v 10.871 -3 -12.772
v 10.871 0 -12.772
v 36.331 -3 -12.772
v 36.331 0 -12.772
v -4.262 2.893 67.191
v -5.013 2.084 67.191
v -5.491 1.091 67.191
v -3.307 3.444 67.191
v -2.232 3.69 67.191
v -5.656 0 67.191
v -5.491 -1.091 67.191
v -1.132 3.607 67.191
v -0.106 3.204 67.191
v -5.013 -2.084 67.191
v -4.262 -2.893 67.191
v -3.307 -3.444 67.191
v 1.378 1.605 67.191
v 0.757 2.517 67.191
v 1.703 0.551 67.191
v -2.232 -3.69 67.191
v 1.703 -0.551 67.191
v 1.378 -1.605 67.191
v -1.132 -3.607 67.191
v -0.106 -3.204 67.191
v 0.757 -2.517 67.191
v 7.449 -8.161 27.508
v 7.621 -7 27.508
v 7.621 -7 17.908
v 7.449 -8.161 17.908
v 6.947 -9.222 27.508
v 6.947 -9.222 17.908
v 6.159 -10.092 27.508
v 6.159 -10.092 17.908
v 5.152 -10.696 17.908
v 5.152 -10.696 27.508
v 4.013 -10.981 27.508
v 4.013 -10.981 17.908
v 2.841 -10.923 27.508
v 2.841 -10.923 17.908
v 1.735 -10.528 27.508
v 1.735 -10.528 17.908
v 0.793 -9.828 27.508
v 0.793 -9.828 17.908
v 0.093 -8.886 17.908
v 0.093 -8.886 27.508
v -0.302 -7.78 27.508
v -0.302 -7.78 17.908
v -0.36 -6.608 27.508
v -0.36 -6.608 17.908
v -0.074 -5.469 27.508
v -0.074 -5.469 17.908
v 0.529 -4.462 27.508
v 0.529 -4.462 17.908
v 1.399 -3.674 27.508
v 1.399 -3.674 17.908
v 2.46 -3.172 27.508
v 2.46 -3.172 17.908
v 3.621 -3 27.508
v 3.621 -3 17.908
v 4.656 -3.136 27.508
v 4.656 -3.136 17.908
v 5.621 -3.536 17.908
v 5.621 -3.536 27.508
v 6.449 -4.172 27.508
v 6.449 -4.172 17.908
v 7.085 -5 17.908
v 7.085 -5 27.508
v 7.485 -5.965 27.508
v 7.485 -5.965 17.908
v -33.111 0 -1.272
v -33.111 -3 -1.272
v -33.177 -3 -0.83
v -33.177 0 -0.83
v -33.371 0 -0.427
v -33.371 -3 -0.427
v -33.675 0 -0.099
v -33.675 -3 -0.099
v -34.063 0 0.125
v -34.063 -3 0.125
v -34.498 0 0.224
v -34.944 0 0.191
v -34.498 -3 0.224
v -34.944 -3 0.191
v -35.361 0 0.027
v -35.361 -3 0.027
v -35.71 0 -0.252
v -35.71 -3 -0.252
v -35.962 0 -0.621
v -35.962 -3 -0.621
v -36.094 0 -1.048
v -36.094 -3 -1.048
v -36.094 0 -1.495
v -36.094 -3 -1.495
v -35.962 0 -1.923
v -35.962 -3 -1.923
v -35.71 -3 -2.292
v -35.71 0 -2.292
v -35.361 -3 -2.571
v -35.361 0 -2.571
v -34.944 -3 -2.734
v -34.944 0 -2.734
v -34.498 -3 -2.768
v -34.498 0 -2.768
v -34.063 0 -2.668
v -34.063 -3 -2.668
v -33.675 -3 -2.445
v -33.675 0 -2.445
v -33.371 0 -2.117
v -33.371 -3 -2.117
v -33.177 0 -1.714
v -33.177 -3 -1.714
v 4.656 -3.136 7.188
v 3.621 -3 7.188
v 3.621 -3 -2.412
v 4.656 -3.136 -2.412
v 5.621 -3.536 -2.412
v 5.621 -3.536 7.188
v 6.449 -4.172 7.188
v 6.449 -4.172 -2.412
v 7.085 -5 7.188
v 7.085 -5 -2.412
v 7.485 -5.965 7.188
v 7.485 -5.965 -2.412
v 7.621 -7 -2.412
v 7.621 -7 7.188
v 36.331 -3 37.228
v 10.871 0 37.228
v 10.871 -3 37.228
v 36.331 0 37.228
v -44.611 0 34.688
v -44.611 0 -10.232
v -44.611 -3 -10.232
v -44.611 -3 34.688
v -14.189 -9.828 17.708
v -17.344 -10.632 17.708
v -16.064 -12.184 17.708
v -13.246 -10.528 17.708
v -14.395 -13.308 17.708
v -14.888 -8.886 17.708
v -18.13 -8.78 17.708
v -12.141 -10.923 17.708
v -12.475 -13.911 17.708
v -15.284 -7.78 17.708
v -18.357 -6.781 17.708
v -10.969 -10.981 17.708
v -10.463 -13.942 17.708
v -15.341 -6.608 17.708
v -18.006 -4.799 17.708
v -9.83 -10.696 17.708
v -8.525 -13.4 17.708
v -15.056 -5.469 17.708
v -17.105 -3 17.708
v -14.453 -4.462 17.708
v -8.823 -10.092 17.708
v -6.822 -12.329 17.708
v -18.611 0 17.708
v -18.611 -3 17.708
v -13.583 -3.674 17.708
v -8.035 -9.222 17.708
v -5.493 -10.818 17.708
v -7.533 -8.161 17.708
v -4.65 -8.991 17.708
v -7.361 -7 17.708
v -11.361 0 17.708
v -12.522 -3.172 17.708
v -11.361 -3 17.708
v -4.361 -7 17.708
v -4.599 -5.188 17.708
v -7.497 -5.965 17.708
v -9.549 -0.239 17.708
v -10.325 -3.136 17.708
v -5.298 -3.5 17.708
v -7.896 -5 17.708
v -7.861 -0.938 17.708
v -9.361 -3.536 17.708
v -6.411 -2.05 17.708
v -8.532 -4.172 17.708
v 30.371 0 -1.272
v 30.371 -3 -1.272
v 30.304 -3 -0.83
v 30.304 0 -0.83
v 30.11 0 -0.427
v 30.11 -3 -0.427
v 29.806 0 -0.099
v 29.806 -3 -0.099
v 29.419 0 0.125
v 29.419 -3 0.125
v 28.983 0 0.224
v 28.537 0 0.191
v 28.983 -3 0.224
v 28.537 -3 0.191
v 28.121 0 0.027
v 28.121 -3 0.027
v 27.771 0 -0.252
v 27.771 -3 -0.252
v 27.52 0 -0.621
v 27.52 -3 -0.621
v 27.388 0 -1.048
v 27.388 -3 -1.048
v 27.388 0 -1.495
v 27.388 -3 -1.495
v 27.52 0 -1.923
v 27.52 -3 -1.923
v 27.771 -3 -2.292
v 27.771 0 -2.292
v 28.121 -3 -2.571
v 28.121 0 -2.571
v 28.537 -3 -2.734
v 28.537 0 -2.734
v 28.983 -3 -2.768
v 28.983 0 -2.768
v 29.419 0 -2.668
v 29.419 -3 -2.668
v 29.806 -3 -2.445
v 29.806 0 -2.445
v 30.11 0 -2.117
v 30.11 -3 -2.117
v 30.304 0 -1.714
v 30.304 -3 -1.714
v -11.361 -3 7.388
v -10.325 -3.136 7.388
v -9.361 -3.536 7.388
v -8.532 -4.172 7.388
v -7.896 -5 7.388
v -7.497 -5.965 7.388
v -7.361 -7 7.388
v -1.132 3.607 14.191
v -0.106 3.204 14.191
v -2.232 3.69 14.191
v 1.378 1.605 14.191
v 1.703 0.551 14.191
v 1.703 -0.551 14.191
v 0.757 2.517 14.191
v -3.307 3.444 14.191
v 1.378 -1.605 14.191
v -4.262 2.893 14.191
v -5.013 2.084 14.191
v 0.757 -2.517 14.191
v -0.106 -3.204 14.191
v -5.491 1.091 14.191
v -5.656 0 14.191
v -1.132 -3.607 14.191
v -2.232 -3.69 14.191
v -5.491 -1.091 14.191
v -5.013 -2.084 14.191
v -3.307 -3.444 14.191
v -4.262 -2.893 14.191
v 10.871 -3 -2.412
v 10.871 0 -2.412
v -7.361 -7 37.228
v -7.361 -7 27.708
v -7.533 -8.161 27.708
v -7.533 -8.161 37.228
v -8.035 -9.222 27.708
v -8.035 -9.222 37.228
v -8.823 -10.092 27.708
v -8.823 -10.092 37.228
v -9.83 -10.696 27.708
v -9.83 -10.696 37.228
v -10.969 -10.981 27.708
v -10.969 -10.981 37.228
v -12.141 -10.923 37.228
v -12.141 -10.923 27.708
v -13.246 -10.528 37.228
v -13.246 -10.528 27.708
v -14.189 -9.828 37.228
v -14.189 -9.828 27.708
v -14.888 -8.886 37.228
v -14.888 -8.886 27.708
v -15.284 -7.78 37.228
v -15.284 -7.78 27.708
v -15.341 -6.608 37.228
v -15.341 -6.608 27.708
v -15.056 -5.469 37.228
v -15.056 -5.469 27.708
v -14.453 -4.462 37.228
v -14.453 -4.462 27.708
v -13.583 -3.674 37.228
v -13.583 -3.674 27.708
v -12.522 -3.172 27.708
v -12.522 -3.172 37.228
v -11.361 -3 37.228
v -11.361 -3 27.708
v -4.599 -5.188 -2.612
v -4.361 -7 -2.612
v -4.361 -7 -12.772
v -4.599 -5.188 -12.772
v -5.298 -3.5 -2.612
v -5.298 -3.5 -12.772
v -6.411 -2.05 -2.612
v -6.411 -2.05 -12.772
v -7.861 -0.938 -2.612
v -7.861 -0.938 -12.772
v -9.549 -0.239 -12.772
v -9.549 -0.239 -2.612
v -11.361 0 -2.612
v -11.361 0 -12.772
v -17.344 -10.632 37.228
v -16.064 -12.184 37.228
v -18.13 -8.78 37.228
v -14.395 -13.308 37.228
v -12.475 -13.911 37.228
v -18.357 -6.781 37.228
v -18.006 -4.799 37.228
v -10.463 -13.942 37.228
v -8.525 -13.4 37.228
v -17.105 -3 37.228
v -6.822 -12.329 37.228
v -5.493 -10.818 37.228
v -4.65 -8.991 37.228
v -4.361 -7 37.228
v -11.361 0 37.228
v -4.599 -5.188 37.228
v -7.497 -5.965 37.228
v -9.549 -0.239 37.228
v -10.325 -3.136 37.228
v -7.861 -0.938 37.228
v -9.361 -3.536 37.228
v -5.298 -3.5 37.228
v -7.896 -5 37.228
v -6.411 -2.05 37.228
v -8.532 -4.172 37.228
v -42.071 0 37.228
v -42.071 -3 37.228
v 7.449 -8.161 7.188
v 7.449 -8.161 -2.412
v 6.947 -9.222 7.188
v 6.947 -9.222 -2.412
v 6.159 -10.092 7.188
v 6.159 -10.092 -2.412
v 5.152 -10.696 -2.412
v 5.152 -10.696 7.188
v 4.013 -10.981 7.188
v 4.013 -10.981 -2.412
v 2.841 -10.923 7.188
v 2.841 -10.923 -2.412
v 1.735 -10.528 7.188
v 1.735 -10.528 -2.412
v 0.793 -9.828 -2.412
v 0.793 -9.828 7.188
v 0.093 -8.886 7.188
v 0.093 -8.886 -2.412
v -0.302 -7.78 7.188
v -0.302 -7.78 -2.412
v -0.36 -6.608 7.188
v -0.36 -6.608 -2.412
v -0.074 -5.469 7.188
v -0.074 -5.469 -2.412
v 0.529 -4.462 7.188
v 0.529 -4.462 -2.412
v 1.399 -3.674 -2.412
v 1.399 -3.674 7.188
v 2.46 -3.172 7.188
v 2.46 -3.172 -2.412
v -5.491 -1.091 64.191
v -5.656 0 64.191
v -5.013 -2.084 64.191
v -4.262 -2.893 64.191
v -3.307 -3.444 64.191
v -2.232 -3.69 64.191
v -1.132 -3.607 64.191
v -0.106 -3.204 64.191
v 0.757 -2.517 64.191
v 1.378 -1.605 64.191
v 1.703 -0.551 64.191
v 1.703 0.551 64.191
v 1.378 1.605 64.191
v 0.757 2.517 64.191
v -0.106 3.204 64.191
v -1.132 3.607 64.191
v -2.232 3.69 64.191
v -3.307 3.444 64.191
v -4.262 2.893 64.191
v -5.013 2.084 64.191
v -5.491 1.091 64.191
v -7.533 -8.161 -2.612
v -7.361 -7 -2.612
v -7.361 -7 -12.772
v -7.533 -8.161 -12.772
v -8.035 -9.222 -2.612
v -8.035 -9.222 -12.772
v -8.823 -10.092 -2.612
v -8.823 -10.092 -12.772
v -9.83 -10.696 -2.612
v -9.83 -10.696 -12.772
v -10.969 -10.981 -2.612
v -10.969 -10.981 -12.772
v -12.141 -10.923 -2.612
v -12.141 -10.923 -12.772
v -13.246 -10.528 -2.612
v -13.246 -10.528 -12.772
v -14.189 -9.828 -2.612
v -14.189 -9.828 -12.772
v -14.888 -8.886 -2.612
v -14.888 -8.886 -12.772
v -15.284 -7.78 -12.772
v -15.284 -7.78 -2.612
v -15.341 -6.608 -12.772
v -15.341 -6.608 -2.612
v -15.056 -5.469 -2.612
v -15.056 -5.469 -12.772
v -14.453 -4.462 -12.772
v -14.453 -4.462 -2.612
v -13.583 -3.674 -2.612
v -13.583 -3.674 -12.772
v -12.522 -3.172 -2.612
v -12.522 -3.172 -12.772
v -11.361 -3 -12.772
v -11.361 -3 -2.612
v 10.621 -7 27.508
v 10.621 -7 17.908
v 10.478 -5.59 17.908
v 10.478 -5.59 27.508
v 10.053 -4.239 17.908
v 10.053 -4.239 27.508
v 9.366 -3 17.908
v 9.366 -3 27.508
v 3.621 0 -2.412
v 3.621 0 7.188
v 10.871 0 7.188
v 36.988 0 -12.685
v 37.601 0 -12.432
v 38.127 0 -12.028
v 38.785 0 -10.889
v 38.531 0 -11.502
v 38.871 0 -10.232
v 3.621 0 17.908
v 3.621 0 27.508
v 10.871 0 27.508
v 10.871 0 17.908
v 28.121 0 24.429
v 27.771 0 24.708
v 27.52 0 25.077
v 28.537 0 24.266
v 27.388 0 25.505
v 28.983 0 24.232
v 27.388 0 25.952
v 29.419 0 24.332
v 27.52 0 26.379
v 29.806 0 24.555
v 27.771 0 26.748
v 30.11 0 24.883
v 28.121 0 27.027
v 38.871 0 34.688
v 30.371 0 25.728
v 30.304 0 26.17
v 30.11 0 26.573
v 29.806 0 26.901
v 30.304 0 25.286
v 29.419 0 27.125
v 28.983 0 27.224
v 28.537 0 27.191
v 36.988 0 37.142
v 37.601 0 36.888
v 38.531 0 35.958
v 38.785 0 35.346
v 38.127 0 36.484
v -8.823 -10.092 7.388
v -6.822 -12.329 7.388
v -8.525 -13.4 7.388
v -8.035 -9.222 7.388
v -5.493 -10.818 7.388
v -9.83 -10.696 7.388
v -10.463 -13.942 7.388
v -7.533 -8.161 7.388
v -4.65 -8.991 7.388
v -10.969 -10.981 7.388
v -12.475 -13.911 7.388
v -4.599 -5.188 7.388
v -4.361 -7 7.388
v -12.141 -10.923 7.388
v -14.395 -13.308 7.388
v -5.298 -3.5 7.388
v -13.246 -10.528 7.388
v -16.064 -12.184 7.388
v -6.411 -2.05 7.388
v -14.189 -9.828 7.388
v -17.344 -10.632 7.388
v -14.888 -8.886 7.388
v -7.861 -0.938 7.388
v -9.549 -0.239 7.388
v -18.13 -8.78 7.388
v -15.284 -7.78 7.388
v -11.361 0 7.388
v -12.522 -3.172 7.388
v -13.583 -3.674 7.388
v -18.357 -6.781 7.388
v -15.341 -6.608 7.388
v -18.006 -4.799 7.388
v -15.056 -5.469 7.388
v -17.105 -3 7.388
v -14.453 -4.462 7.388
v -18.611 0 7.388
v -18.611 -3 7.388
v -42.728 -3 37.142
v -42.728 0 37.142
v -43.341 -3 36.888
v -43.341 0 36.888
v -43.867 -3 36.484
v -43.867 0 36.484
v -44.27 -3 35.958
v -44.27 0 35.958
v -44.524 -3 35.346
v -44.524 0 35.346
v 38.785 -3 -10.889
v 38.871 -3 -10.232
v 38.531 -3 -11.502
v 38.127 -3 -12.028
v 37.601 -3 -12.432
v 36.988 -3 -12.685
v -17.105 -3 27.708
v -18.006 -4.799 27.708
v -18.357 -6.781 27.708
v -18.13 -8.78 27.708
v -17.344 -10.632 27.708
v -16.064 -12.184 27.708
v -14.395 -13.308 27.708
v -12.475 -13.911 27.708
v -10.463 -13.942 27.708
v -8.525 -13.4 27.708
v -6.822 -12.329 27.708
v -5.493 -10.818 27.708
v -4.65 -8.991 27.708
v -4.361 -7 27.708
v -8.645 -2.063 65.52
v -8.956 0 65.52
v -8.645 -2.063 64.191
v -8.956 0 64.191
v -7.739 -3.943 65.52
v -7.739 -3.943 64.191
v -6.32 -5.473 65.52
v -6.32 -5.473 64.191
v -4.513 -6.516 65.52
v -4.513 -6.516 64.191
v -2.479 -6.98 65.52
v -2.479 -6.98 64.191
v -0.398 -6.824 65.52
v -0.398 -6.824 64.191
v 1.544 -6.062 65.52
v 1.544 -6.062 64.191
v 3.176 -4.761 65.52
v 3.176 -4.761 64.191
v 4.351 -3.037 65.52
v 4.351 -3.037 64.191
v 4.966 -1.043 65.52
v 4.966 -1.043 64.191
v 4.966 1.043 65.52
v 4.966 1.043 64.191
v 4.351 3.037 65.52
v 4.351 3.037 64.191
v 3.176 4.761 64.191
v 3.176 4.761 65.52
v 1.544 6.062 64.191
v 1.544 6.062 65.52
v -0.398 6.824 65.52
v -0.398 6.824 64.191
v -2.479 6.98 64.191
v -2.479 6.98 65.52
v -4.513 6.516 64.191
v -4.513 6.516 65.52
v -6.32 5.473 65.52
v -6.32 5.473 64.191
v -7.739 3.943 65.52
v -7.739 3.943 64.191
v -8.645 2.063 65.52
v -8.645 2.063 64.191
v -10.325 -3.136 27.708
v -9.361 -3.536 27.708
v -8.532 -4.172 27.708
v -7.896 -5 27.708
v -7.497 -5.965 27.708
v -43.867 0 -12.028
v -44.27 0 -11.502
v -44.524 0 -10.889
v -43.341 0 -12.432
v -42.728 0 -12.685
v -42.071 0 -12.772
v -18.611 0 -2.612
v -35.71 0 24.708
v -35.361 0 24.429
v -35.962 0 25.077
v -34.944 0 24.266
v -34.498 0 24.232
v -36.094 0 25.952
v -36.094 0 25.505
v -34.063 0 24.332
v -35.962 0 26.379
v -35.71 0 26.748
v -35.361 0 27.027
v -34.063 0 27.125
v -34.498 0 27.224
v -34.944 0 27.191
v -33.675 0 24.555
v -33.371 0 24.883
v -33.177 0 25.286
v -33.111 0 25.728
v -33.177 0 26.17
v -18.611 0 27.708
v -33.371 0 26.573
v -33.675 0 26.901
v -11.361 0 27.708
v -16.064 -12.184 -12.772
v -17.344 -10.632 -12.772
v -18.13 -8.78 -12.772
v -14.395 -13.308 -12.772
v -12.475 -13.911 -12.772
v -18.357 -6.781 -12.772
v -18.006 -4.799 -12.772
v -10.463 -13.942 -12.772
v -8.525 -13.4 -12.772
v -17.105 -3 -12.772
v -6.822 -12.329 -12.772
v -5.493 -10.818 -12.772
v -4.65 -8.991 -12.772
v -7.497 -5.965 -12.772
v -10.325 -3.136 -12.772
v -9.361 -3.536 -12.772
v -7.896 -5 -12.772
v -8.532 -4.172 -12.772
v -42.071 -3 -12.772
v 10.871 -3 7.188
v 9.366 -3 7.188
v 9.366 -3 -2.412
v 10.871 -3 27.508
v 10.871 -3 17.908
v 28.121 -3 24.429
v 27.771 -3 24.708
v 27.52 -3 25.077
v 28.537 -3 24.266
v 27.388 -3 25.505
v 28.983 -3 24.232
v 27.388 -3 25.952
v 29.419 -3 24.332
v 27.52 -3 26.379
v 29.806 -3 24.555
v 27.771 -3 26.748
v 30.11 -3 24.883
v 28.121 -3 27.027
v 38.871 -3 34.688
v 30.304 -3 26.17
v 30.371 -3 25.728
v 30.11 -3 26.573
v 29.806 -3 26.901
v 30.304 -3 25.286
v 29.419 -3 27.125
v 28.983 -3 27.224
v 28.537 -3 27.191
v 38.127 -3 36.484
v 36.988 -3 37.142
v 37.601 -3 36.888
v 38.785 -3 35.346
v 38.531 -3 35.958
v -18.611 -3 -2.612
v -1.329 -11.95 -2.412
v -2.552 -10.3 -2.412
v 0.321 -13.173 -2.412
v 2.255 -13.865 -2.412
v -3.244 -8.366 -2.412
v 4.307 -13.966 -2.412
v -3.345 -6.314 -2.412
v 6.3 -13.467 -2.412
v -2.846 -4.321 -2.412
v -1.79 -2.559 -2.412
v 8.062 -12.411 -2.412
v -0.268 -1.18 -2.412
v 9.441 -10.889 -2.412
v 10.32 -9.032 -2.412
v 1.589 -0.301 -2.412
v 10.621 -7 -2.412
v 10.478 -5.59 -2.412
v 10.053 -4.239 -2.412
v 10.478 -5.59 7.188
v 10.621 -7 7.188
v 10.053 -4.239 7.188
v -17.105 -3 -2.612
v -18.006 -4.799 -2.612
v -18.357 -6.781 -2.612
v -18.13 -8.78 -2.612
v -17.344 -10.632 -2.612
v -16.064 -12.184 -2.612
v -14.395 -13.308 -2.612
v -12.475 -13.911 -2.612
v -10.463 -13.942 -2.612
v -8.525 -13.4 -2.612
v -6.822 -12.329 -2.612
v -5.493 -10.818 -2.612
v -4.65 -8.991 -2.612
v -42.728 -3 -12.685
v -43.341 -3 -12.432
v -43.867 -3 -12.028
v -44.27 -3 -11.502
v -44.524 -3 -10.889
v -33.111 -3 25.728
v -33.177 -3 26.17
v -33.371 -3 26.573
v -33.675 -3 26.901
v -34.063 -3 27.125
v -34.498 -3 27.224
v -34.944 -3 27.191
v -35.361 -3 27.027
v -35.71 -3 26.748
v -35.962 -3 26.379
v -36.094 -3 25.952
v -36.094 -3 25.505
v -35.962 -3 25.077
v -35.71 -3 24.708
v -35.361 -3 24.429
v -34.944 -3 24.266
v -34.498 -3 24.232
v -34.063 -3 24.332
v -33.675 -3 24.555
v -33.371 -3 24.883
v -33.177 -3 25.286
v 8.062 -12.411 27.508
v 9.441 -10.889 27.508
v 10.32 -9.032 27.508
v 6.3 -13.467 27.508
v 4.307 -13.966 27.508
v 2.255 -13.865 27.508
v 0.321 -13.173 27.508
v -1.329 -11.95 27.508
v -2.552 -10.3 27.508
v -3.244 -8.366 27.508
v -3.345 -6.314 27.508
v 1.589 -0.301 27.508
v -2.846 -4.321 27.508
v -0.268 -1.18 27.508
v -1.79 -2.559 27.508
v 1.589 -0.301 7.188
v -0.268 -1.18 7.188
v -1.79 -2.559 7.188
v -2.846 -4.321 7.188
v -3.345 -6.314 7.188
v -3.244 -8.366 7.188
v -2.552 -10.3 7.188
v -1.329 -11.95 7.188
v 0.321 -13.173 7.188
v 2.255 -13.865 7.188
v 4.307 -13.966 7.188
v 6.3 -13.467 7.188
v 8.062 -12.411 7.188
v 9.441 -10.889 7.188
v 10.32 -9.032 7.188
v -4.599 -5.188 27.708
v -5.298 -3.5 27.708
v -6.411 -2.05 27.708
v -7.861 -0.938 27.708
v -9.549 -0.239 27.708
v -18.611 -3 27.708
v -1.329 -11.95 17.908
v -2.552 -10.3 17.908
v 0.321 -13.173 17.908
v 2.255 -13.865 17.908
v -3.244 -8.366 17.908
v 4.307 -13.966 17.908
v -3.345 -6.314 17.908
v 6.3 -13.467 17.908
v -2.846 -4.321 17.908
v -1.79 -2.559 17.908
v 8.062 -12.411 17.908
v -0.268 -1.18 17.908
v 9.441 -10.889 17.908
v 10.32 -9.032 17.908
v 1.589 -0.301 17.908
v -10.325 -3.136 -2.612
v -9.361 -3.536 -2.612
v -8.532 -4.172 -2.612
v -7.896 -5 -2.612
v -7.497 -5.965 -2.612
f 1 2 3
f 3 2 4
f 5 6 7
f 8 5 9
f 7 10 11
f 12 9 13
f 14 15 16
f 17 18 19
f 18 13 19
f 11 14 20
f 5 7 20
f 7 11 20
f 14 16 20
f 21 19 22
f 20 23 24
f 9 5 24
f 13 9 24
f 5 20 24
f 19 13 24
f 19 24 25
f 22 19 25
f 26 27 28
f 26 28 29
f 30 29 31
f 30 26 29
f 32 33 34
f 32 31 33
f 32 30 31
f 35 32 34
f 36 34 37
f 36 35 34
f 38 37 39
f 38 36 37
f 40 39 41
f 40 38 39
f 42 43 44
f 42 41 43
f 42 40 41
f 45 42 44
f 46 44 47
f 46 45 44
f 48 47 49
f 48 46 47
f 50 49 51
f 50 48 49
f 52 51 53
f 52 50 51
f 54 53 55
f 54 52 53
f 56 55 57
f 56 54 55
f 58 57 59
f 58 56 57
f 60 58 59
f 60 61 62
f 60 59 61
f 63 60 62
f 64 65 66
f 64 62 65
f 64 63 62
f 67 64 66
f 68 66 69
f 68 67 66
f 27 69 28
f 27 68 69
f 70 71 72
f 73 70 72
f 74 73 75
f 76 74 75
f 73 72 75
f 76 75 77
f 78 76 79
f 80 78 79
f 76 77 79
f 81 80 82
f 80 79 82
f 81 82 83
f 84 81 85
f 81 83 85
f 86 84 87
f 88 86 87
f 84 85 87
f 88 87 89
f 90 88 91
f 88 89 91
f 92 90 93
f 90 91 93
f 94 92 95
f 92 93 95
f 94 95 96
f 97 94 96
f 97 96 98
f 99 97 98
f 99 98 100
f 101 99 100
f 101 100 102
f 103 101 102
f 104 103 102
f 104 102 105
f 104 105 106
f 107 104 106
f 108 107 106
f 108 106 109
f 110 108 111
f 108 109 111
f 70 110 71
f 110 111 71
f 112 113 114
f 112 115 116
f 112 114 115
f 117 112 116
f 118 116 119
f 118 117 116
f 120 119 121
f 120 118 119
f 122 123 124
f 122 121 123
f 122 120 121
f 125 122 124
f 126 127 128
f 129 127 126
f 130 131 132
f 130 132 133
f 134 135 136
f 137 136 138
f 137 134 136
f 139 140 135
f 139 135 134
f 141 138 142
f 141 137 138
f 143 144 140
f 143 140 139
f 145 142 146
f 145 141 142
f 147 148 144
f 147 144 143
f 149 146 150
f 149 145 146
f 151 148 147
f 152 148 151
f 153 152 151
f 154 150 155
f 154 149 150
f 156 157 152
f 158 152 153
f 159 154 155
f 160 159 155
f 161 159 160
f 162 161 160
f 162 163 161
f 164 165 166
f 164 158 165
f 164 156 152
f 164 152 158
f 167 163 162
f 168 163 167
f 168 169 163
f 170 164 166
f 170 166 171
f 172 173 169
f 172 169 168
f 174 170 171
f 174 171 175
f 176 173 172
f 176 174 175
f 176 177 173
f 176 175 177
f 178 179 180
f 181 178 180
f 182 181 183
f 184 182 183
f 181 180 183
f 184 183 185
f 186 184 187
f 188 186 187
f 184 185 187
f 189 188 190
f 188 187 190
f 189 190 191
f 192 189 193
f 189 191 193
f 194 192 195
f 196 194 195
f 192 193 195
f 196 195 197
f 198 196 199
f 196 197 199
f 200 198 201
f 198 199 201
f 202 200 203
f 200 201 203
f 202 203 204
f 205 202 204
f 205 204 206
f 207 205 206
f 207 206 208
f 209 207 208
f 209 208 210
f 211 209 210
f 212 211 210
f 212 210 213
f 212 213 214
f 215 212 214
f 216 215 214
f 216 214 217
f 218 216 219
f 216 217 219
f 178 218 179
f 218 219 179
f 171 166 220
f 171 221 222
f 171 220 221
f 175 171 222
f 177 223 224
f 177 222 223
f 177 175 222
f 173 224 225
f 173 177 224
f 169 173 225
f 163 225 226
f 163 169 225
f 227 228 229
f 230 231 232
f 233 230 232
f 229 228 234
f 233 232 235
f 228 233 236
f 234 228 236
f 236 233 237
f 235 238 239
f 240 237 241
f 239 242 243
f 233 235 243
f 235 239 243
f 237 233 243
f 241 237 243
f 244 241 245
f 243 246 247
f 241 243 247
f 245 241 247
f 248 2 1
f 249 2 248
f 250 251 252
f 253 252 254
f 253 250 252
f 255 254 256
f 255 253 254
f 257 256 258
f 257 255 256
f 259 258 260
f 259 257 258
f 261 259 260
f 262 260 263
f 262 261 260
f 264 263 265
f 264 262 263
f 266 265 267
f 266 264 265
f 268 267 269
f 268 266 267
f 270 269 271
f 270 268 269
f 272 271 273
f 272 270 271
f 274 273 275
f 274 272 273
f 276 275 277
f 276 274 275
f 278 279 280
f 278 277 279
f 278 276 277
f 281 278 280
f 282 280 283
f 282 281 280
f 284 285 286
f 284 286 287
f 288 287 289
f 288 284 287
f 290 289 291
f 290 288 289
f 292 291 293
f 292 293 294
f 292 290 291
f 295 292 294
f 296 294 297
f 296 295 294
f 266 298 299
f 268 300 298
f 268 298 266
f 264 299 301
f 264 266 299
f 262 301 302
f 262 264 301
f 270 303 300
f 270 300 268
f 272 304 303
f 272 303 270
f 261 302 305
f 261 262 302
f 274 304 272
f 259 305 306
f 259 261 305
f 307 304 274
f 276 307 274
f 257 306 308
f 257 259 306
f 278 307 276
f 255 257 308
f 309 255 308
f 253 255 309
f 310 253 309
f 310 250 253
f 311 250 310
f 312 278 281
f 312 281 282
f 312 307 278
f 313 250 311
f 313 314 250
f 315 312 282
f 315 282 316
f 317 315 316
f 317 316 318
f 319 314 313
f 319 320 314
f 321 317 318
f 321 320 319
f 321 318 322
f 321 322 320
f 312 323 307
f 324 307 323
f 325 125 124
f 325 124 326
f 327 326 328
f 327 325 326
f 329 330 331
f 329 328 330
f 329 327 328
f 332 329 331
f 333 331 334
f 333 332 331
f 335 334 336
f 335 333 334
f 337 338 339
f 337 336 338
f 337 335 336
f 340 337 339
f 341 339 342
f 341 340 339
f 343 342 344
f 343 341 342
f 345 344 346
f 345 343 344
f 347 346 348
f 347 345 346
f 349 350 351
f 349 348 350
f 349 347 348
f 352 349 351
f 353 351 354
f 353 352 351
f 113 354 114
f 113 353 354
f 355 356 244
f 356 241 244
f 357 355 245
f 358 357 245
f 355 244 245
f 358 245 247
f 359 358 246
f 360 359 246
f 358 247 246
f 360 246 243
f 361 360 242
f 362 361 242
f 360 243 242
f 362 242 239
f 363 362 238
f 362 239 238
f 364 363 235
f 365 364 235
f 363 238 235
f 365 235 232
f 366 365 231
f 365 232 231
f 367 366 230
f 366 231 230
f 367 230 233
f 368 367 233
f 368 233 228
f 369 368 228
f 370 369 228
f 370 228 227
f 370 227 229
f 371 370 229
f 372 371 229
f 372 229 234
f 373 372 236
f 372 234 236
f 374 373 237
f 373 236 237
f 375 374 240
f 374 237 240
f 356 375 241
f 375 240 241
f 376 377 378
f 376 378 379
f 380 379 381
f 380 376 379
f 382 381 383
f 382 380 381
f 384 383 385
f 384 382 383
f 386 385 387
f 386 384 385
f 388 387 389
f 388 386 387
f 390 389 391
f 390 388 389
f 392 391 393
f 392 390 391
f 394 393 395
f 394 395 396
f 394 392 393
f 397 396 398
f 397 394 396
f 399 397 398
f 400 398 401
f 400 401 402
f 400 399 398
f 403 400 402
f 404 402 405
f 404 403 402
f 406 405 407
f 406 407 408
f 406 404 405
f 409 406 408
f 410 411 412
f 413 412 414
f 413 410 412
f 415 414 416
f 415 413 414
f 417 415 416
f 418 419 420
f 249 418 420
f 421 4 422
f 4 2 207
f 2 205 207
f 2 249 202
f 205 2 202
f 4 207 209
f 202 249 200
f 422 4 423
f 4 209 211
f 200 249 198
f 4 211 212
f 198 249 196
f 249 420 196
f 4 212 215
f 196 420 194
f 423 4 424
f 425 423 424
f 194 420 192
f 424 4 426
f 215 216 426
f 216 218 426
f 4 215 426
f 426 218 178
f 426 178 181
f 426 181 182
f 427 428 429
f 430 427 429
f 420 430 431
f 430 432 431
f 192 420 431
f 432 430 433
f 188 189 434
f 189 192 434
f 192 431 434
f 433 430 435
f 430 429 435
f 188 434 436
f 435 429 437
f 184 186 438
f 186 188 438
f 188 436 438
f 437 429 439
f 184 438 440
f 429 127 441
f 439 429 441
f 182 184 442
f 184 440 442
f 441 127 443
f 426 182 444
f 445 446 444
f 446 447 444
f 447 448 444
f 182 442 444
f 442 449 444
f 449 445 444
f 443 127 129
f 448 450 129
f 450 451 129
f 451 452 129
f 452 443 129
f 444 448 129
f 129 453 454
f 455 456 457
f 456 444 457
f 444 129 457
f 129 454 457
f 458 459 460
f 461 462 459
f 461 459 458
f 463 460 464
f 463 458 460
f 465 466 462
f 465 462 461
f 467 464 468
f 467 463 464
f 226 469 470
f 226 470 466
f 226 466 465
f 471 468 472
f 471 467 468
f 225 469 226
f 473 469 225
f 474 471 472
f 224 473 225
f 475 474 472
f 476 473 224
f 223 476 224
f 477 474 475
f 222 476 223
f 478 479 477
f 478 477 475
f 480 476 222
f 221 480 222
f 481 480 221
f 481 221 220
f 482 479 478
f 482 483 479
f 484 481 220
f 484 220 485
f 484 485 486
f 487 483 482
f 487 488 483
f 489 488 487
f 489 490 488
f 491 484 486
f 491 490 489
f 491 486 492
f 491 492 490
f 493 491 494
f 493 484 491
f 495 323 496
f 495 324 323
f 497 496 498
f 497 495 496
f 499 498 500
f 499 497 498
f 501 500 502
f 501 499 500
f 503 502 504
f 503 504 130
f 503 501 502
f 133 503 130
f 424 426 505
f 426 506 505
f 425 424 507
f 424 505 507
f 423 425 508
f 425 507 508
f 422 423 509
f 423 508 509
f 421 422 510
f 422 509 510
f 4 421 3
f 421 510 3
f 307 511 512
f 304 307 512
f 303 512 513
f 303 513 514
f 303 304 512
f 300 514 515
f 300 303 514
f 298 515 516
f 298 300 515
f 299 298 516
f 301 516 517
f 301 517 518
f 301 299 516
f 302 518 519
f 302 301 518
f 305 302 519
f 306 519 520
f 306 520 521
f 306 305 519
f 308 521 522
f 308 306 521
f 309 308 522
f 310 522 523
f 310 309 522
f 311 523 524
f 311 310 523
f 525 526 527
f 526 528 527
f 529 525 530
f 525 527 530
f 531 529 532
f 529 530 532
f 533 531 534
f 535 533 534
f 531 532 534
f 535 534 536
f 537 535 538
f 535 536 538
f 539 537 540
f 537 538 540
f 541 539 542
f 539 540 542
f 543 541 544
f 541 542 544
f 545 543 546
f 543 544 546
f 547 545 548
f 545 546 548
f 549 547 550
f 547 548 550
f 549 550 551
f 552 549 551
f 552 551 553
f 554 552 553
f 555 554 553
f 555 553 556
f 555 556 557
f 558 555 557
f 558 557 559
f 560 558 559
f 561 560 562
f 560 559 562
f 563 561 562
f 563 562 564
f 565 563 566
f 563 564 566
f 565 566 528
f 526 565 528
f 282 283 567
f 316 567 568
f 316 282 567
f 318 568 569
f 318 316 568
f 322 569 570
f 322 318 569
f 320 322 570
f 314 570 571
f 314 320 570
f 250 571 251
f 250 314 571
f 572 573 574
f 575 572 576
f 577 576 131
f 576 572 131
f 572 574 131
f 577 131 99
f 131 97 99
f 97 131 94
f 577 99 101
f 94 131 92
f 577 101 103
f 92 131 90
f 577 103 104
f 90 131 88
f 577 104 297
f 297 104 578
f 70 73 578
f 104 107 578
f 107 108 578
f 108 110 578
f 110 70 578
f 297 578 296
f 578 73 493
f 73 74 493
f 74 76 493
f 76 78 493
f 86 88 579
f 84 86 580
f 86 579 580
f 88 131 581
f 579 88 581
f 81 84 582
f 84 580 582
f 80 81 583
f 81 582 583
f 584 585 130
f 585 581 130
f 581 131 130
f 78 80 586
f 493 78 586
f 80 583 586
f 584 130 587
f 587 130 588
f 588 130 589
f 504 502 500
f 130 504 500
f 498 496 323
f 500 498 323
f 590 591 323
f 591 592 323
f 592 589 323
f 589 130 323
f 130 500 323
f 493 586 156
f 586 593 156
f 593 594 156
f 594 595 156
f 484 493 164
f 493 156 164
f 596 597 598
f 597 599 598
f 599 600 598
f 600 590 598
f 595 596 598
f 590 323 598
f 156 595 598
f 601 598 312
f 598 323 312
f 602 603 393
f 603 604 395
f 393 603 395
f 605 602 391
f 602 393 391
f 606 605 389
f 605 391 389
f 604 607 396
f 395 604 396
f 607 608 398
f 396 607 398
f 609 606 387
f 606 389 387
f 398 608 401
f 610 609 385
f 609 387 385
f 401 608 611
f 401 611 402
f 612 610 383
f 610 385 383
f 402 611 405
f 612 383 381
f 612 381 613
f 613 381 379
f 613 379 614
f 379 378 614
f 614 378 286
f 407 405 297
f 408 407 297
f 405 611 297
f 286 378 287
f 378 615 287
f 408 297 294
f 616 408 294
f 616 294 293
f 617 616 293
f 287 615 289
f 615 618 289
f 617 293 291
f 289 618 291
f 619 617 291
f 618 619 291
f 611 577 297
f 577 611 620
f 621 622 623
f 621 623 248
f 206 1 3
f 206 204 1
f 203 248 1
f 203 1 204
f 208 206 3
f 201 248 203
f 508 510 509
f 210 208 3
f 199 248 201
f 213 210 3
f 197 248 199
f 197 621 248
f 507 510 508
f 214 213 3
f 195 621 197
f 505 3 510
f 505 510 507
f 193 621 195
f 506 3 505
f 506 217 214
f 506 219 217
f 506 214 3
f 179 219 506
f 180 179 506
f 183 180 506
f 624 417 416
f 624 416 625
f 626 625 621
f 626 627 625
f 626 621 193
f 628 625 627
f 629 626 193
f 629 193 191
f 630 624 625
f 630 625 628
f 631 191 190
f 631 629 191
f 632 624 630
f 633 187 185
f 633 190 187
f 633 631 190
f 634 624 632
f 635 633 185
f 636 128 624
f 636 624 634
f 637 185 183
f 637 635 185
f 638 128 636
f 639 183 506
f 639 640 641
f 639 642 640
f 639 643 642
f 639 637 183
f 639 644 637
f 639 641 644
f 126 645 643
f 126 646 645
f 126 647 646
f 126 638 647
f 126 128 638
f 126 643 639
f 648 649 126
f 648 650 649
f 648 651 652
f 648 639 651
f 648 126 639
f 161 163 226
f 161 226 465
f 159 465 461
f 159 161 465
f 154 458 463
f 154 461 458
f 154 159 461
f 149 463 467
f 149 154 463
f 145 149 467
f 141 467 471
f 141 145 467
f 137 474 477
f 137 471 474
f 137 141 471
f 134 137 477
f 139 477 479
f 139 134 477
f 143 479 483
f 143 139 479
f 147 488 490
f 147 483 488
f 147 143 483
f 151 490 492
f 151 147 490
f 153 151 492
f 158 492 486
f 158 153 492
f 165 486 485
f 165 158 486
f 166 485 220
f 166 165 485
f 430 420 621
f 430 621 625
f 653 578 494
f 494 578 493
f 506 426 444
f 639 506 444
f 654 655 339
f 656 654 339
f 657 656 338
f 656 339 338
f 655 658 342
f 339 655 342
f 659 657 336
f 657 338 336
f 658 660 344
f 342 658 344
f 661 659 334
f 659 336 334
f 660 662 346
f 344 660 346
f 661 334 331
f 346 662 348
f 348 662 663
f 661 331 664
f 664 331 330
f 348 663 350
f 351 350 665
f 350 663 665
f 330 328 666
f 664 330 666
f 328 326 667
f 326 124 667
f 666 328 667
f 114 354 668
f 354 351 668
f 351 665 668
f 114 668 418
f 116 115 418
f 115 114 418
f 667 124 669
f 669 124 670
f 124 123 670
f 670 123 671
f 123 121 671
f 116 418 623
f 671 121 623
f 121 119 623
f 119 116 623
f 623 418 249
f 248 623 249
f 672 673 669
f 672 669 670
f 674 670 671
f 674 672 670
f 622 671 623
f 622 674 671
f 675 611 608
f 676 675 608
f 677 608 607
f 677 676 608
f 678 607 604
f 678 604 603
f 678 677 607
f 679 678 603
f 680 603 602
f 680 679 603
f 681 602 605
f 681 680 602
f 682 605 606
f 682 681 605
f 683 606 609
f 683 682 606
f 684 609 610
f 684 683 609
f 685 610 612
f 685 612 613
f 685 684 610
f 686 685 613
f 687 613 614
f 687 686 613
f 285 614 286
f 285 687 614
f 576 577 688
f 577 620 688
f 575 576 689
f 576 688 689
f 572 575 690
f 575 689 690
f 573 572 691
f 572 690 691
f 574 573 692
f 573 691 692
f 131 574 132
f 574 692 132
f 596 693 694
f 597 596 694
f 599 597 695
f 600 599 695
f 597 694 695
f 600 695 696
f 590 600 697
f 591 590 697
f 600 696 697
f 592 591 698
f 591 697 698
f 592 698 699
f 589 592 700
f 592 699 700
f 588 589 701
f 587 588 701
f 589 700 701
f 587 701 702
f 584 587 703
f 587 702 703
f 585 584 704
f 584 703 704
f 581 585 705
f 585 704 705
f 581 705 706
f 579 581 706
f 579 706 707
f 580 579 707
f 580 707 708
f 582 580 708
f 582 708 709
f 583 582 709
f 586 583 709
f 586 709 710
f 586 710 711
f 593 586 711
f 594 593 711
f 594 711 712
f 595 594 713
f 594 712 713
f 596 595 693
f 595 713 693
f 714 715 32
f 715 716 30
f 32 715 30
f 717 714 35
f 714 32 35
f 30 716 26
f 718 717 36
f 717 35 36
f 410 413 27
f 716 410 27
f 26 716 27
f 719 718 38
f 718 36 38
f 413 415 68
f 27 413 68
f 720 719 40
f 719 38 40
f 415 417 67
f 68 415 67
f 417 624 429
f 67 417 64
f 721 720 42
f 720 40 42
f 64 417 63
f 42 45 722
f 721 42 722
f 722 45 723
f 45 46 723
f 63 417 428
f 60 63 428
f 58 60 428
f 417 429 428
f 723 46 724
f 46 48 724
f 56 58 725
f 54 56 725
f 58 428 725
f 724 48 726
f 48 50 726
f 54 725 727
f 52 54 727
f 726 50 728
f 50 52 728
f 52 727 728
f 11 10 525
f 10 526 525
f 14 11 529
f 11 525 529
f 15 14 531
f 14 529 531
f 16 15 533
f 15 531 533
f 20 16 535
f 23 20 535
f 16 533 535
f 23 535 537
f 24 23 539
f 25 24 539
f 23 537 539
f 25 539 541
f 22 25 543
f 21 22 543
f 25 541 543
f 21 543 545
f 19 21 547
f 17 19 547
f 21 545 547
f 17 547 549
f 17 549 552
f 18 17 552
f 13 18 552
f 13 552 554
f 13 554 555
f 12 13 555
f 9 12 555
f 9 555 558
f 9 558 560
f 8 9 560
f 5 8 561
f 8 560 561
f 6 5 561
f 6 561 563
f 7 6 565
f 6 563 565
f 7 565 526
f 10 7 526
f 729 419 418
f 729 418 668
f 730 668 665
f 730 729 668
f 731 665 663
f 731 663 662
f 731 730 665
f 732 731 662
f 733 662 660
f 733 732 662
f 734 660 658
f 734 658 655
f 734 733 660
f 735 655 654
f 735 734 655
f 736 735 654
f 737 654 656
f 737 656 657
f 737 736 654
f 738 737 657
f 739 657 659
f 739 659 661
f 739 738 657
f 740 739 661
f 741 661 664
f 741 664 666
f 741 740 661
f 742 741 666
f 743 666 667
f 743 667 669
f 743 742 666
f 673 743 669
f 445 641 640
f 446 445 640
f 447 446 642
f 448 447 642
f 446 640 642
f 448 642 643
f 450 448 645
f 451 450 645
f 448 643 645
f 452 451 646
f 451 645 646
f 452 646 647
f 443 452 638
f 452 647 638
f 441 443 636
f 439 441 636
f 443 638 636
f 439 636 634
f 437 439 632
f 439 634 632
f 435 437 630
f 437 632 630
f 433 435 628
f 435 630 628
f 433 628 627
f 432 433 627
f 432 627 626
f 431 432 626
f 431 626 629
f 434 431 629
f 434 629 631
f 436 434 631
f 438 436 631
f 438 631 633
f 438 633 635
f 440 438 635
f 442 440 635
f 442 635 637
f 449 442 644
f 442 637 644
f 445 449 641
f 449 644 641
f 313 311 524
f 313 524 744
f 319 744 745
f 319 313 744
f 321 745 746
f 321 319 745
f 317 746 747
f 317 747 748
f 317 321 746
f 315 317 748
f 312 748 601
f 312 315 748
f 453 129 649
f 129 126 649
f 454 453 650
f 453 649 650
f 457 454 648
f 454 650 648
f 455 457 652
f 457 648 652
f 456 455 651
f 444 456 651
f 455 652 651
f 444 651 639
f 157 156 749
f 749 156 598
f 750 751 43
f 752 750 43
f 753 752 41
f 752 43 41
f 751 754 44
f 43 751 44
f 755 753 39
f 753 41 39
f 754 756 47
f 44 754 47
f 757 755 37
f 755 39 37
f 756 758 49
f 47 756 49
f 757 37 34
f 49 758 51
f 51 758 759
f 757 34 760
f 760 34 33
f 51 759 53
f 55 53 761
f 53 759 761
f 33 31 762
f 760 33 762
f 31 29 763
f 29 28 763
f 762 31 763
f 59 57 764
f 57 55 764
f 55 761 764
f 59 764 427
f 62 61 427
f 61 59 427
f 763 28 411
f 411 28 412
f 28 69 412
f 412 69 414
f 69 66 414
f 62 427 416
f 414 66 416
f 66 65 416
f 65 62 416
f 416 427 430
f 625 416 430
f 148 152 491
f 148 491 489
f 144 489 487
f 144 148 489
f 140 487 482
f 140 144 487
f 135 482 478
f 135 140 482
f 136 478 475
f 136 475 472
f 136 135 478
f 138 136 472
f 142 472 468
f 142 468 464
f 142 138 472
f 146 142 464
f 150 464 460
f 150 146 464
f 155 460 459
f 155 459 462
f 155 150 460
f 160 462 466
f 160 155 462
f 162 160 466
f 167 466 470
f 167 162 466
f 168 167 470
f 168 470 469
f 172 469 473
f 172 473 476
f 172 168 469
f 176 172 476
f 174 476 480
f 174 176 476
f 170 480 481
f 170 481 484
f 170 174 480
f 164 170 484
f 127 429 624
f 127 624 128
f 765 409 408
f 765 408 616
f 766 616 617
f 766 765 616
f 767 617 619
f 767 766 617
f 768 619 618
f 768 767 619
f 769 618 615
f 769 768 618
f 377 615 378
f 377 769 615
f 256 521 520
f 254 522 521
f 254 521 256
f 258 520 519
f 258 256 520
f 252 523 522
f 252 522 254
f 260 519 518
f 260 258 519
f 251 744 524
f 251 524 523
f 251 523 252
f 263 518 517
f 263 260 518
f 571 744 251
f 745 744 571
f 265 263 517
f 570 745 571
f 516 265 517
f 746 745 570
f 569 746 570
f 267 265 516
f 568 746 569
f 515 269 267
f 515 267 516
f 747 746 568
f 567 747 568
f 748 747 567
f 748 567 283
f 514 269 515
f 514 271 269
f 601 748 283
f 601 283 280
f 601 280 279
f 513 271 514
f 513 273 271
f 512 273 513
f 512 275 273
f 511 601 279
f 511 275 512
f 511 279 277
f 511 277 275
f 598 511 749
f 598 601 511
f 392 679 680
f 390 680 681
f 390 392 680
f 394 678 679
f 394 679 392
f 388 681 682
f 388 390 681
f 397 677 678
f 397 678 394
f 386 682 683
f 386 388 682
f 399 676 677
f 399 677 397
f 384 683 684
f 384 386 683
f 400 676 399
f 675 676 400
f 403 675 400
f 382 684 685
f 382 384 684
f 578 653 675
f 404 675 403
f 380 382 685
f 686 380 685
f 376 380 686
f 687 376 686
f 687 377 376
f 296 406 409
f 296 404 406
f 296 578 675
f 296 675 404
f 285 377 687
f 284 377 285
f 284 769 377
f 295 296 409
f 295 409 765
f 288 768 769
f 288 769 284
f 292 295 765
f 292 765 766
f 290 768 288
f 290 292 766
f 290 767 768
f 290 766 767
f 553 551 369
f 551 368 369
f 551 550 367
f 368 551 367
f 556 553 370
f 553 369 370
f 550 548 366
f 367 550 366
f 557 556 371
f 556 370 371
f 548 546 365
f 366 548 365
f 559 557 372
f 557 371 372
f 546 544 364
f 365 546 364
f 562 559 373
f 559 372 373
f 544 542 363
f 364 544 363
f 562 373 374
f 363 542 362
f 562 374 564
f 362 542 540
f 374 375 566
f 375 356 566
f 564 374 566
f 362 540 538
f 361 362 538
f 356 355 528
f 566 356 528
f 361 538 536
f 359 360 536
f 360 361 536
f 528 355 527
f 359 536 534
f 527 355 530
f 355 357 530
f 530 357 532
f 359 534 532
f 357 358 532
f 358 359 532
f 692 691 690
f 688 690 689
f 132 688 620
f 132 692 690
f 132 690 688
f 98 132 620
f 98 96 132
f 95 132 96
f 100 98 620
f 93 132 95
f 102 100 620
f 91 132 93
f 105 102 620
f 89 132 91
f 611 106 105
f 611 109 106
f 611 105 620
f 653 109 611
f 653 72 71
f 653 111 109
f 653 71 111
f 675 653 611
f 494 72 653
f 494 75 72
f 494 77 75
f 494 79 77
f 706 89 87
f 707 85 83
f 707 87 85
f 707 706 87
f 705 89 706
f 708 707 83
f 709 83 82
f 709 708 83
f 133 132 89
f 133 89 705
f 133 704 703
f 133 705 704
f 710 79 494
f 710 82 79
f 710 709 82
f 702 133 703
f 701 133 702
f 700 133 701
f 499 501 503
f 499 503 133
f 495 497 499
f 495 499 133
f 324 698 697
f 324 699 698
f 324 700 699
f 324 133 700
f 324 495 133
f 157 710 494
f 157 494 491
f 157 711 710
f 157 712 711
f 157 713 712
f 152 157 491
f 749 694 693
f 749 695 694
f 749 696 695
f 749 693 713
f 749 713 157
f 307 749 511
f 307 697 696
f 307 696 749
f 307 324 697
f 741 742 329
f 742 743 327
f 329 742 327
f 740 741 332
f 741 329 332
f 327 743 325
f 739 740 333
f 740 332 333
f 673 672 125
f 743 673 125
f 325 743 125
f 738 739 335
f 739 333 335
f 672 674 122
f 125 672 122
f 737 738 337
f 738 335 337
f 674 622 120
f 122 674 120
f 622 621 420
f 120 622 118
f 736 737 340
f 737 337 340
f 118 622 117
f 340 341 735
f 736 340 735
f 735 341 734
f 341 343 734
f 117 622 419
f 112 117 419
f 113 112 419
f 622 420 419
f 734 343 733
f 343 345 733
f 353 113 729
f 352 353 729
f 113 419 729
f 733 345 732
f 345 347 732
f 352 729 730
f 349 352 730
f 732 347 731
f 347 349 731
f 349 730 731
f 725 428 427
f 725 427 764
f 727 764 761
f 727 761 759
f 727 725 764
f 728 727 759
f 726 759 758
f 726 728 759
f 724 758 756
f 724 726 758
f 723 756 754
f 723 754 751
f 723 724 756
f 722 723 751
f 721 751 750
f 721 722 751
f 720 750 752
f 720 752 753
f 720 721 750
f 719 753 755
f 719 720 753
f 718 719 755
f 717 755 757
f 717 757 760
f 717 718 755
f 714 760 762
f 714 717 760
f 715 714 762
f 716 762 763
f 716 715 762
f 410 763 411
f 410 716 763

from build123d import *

# Parameters (mm, degrees)
F0_W      = 33.25
F0_H      = 50
F1_DEPTH  = 3
F3_DEPTH  = 50
F5_R      = 2.54
F6_W      = 7.25
F6_H      = 10
F7_DEPTH  = 25.4
F8_W      = 35.25
F8_H      = 50
F9_DEPTH  = 3
F11_DEPTH = 50
F12_W     = 7.25
F12_H     = 9.72
F12_H_2   = 10.72
F12_H_3   = 10.36
F13_DEPTH = 25.4
F17_R     = 2.54
F4_R      = 1.5
F18_DEPTH = 3
F16_R     = 1.5
F19_DEPTH = 3


with BuildPart() as f1:
    # F0 (on Front) → F1 (new body)
    with BuildSketch(Plane.XZ):
        with Locations((-27.9855814096, 12.2281981356)):
            Rectangle(F0_W, F0_H)
    extrude(amount=F1_DEPTH)

    # F2 (on face) → F3 (join, through all)
    with BuildSketch(Plane.XY.offset(37.2281981356)):
        with BuildLine():
            ThreePointArc((-17.1051440562, -3), (-13.4567757559, -13.6787700412), (-4.3605814096, -7))
            ThreePointArc((-4.3605814096, -7), (-6.4108339413, -2.0502525317), (-11.3605814096, 0))
            Line((-11.3605814096, 0), (-11.3605814096, -3))
            Line((-11.3605814096, -3), (-17.1051440562, -3))
        make_face()
        with BuildLine():
            ThreePointArc((-7.3605814096, -7), (-14.1890085344, -9.8284271247), (-11.3605814096, -3))
            ThreePointArc((-11.3605814096, -3), (-8.5321542849, -4.1715728753), (-7.3605814096, -7))
        make_face(mode=Mode.SUBTRACT)
        with BuildLine():
            Line((-11.3605814096, -3), (-11.3605814096, 0))
            ThreePointArc((-11.3605814096, 0), (-14.6009517588, -0.795163177), (-17.1051440562, -3))
            Line((-17.1051440562, -3), (-11.3605814096, -3))
        make_face()
    extrude(amount=-F3_DEPTH)

    # F5
    f5_edges = [f1.edges().sort_by_distance(p)[0] for p in [
        (-44.610581, -1.5, 37.228198),
        (-44.610581, -1.5, -12.771802),
    ]]
    fillet(f5_edges, radius=F5_R)

    # F6 (on face) → F7 (cut)
    with BuildSketch(Plane.XZ):
        with Locations((-14.9855814096, 22.7081981356)):
            Rectangle(F6_W, F6_H)
        with Locations((-7.7355814096, 22.7081981356)):
            Rectangle(F6_W, F6_H)
        with Locations((-14.9855814096, 2.3881981356)):
            Rectangle(F6_W, F6_H)
        with Locations((-7.7355814096, 2.3881981356)):
            Rectangle(F6_W, F6_H)
    extrude(amount=F7_DEPTH, mode=Mode.SUBTRACT)

    # F4 (on face) → F18 (cut)
    with BuildSketch(Plane.XZ.offset(3)):
        with Locations((-34.6105814096, -1.2718018644)):
            Circle(F4_R)
        with Locations((-34.6105814096, 25.7281981356)):
            Circle(F4_R)
    extrude(amount=-F18_DEPTH, mode=Mode.SUBTRACT)


with BuildPart() as f9:
    # F8 (on Front) → F9 (new body)
    with BuildSketch(Plane.XZ):
        with Locations((21.2460542523, 12.2281981356)):
            Rectangle(F8_W, F8_H)
    extrude(amount=F9_DEPTH)

    # F10 (on face) → F11 (join, through all)
    with BuildSketch(Plane.XY.offset(37.2281981356)):
        with BuildLine():
            Line((3.6210542523, -3), (3.6210542523, 0))
            ThreePointArc((3.6210542523, 0), (-1.328693216, -11.9497474683), (10.6210542523, -7))
            ThreePointArc((10.6210542523, -7), (10.2998242935, -4.9038056538), (9.3656168989, -3))
            Line((9.3656168989, -3), (3.6210542523, -3))
        make_face()
        with BuildLine():
            ThreePointArc((7.6210542523, -7), (0.7926271276, -9.8284271247), (3.6210542523, -3))
            ThreePointArc((3.6210542523, -3), (6.4494813771, -4.1715728753), (7.6210542523, -7))
        make_face(mode=Mode.SUBTRACT)
    extrude(amount=-F11_DEPTH)

    # F12 (on face) → F13 (cut)
    with BuildSketch(Plane(origin=(0, 0, 0), x_dir=(-1, 0, 0), z_dir=(0, 1, 0))):
        with Locations((0.0039457477, 32.3681981356)):
            Rectangle(F12_W, F12_H)
        with Locations((-7.2460542523, 32.3681981356)):
            Rectangle(F12_W, F12_H)
        with Locations((-7.2460542523, 12.5481981356)):
            Rectangle(F12_W, F12_H_2)
        with Locations((0.0039457477, 12.5481981356)):
            Rectangle(F12_W, F12_H_2)
        with Locations((0.0039457477, -7.5918018644)):
            Rectangle(F12_W, F12_H_3)
        with Locations((-7.2460542523, -7.5918018644)):
            Rectangle(F12_W, F12_H_3)
    extrude(amount=-F13_DEPTH, mode=Mode.SUBTRACT)

    # F17
    f17_edges = [f9.edges().sort_by_distance(p)[0] for p in [
        (38.871054, -1.5, 37.228198),
        (38.871054, -1.5, -12.771802),
    ]]
    fillet(f17_edges, radius=F17_R)

    # F16 (on face) → F19 (cut)
    with BuildSketch(Plane.XZ.offset(3)):
        with Locations((28.8710542523, 25.7281981356)):
            Circle(F16_R)
        with Locations((28.8710542523, -1.2718018644)):
            Circle(F16_R)
    extrude(amount=-F19_DEPTH, mode=Mode.SUBTRACT)


with BuildPart() as f15:
    # F14 (on Front) → F15 (revolve)
    with BuildSketch(Plane.XZ):
        Polygon((-8.9555652812, 64.1912163931), (-5.6555652812, 64.1912163931), (-5.6555652812, 14.1912163931), (-1.9555652812, 14.1912163931), (-1.9555652812, 67.1912163931), (-5.6555652812, 67.1912163931), (-8.9555652812, 65.5202418566), align=None)
    revolve(axis=Axis((-1.9555652812, 0, 40.6912163931), (0, 0, 1)))


solid = Compound([f1.part, f9.part, f15.part])
